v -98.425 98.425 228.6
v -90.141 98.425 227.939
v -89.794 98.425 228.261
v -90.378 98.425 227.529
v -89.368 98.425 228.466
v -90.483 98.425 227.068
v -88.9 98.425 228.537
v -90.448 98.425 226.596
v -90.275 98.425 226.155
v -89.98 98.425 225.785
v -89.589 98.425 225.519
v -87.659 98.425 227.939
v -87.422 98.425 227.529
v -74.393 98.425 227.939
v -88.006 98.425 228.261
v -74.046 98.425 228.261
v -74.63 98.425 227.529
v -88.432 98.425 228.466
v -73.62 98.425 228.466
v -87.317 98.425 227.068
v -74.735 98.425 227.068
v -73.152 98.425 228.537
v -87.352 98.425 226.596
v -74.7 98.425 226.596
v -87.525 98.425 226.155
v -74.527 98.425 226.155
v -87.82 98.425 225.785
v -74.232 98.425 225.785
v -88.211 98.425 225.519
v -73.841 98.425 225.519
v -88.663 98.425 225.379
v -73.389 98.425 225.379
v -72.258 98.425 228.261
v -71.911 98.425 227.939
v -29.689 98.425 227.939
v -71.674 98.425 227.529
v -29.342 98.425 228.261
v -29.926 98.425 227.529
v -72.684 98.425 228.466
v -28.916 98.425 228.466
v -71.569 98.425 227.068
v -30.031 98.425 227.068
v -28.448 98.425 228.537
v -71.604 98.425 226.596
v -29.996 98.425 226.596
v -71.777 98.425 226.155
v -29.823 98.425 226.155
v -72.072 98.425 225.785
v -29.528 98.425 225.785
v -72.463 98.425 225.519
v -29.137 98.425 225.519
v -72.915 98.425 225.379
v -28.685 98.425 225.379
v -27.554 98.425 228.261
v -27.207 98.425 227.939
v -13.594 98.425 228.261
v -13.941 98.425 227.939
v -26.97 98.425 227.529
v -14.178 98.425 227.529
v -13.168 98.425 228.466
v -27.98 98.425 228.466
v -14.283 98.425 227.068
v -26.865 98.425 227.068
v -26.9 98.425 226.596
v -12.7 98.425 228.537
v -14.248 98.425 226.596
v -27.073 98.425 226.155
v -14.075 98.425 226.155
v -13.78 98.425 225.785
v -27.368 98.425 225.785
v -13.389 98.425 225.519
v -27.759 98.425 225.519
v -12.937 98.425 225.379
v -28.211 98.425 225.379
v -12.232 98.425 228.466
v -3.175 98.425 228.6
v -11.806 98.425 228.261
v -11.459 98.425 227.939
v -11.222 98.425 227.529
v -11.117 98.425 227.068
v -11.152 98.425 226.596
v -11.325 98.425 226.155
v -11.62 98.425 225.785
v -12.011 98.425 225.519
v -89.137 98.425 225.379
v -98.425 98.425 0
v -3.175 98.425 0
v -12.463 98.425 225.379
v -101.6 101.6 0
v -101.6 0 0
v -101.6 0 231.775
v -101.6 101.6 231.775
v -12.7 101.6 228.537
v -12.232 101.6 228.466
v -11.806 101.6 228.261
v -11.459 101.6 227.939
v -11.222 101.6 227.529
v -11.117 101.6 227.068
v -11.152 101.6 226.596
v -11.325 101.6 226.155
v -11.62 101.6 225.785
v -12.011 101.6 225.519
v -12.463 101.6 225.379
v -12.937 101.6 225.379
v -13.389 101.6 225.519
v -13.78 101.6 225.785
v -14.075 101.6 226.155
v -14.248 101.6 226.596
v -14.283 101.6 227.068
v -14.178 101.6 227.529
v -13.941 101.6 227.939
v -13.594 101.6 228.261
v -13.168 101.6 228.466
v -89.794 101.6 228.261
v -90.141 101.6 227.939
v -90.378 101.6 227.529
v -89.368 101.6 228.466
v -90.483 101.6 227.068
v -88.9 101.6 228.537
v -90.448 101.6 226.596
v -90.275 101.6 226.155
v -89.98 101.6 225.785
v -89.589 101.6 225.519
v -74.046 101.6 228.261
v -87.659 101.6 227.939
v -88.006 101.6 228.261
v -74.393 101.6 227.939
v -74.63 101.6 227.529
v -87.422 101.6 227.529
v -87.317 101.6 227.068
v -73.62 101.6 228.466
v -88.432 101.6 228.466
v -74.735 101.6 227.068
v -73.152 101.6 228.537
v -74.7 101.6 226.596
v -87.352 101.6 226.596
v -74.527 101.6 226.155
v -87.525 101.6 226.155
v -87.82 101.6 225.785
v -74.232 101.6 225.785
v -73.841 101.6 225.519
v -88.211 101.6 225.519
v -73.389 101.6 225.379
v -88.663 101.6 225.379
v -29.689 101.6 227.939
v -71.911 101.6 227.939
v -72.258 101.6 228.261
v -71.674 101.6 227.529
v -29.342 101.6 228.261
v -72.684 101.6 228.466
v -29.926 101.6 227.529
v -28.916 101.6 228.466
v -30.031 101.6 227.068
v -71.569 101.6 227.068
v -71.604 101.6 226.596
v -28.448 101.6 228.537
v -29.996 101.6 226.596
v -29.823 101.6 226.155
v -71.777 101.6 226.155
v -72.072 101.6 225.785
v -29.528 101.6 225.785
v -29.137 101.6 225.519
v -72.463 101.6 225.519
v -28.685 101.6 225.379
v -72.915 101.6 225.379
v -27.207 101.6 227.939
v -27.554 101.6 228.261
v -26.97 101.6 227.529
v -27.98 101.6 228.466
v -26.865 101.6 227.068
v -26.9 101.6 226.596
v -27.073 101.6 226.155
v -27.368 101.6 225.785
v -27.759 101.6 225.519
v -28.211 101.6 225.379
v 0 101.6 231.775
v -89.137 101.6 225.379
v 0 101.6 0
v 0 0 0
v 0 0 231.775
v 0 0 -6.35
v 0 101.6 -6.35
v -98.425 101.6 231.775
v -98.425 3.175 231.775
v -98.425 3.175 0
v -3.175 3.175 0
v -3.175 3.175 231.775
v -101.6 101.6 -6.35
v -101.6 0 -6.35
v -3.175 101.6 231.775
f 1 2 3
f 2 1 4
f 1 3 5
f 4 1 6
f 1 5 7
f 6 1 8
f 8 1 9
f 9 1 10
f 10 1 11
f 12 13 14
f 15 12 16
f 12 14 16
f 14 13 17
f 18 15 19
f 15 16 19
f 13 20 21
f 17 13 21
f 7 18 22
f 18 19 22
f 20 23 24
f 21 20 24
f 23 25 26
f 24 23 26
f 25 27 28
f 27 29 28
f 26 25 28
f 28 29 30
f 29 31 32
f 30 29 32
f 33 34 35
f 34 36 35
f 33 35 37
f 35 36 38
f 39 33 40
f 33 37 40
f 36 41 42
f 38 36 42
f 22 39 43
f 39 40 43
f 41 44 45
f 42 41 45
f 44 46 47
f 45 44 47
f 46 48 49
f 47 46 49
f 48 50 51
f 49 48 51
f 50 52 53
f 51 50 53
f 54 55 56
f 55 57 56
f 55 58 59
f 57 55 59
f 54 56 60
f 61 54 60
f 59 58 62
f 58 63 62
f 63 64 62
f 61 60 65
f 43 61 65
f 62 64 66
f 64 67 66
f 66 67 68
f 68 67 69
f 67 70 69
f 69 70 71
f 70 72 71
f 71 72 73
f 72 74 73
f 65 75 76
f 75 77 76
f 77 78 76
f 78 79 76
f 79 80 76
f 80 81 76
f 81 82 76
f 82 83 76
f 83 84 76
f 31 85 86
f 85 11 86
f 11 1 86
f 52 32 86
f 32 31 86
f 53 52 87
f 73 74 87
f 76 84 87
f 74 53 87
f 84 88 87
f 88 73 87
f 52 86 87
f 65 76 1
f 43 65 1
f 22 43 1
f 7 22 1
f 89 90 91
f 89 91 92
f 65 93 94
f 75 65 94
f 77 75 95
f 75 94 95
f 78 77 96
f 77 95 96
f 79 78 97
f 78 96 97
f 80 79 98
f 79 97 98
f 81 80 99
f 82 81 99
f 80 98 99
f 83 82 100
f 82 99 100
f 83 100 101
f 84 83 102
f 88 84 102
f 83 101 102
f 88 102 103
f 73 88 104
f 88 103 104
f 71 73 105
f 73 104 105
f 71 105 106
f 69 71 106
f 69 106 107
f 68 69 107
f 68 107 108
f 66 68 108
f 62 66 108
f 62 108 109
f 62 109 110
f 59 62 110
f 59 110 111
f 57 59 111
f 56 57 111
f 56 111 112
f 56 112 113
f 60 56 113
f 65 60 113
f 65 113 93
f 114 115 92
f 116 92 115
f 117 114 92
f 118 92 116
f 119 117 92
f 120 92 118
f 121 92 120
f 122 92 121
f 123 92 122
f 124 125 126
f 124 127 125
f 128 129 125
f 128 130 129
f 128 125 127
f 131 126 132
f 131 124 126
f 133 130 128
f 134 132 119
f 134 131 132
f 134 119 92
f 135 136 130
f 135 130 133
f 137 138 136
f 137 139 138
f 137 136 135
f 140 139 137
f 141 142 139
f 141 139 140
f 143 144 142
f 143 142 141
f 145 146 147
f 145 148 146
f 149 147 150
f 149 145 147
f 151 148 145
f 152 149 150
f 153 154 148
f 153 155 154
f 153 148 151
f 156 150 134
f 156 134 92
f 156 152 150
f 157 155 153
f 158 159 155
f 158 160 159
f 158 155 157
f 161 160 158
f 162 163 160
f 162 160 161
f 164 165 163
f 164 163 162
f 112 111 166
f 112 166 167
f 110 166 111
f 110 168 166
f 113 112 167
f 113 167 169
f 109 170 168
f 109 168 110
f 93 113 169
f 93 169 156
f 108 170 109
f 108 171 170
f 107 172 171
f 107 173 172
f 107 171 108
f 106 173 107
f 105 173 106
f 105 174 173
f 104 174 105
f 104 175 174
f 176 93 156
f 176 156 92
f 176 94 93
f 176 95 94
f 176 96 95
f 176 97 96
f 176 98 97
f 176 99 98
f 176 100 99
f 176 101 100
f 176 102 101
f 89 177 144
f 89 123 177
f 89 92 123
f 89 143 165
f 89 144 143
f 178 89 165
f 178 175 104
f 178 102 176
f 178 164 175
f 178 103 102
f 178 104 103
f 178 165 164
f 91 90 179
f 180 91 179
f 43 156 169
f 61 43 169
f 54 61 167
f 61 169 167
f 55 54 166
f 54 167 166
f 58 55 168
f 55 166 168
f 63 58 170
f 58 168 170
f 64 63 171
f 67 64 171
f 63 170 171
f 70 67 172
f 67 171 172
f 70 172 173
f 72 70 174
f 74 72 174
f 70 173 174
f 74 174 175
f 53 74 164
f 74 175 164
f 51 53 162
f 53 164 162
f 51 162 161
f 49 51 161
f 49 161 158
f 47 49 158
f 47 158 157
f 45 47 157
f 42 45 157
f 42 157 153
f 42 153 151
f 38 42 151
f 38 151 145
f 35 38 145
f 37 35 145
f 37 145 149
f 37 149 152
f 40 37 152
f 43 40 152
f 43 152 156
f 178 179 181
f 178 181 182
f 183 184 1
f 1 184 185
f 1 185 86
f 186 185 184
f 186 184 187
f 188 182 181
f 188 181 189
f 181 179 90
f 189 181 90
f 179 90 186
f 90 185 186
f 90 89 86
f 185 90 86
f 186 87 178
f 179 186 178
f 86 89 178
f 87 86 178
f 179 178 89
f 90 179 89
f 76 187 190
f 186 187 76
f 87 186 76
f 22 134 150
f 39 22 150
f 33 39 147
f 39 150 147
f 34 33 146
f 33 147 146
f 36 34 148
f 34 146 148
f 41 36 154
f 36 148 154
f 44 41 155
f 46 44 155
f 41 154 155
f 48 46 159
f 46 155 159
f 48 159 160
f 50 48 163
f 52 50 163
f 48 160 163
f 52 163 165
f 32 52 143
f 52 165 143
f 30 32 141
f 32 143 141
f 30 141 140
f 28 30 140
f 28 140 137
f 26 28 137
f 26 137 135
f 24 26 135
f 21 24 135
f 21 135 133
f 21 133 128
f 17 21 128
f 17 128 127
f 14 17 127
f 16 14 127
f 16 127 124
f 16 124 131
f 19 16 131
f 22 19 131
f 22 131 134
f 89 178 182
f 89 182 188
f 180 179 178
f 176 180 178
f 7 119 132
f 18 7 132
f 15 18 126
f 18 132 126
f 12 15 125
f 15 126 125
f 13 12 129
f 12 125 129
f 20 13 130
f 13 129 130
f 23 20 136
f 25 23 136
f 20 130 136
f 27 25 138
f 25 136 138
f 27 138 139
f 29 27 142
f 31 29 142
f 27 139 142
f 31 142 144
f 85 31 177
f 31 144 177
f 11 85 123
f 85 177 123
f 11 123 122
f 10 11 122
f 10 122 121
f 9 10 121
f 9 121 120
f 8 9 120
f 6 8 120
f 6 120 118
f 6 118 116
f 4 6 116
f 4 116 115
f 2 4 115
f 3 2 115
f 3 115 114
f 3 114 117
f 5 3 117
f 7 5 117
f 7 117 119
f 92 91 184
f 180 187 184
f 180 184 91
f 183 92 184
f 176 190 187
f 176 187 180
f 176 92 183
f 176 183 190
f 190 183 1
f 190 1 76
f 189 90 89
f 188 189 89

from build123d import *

# Parameters (mm, degrees)
SKETCH1_W           = 101.6
SKETCH1_H           = 101.6
SKETCH1_W_2         = 95.25
SKETCH1_H_2         = 95.25
BOSS_EXTRUDE1_DEPTH = 231.775
SKETCH2_W           = 101.6
SKETCH2_H           = 101.6
BOSS_EXTRUDE2_DEPTH = 6.35
CHAMFER1_SIZE       = 3.175
SKETCH3_R           = 1.5875
CUT_EXTRUDE1_DEPTH  = 17.78


with BuildPart() as part:
    # Sketch1 → Boss-Extrude1 (new body)
    with BuildSketch(Plane.XY):
        with Locations((-50.8, 50.8)):
            Rectangle(SKETCH1_W, SKETCH1_H)
        with Locations((-50.8, 50.8)):
            Rectangle(SKETCH1_W_2, SKETCH1_H_2, mode=Mode.SUBTRACT)
    extrude(amount=BOSS_EXTRUDE1_DEPTH)

    # Chamfer1
    chamfer1_edges = [part.edges().sort_by_distance(p)[0] for p in [
        (-50.8, 98.425, 231.775),
    ]]
    chamfer(chamfer1_edges, length=CHAMFER1_SIZE - 0.0001)  # a hair under: the kernel refuses the full size

    # Sketch3 → Cut-Extrude1 (cut)
    with BuildSketch(Plane(origin=(0, 101.6, 0), x_dir=(1, 0, 0), z_dir=(0, 1, 0))):
        with Locations(Location((-88.9, -226.949, 0), (0, 0, 270))):
            Circle(SKETCH3_R)
        with Locations(Location((-73.152, -226.949, 0), (0, 0, 270))):
            Circle(SKETCH3_R)
        with Locations(Location((-28.448, -226.949, 0), (0, 0, 270))):
            Circle(SKETCH3_R)
        with Locations(Location((-12.7, -226.949, 0), (0, 0, 270))):
            Circle(SKETCH3_R)
    extrude(amount=-CUT_EXTRUDE1_DEPTH, mode=Mode.SUBTRACT)


with BuildPart() as body_2:
    # Sketch2 → Boss-Extrude2 (new body)
    with BuildSketch(Plane(origin=(0, 0, 0), x_dir=(-1, 0, 0), z_dir=(0, 0, -1))):
        with Locations((50.8, 50.8)):
            Rectangle(SKETCH2_W, SKETCH2_H)
    extrude(amount=BOSS_EXTRUDE2_DEPTH)


solid = Compound([part.part, body_2.part])
